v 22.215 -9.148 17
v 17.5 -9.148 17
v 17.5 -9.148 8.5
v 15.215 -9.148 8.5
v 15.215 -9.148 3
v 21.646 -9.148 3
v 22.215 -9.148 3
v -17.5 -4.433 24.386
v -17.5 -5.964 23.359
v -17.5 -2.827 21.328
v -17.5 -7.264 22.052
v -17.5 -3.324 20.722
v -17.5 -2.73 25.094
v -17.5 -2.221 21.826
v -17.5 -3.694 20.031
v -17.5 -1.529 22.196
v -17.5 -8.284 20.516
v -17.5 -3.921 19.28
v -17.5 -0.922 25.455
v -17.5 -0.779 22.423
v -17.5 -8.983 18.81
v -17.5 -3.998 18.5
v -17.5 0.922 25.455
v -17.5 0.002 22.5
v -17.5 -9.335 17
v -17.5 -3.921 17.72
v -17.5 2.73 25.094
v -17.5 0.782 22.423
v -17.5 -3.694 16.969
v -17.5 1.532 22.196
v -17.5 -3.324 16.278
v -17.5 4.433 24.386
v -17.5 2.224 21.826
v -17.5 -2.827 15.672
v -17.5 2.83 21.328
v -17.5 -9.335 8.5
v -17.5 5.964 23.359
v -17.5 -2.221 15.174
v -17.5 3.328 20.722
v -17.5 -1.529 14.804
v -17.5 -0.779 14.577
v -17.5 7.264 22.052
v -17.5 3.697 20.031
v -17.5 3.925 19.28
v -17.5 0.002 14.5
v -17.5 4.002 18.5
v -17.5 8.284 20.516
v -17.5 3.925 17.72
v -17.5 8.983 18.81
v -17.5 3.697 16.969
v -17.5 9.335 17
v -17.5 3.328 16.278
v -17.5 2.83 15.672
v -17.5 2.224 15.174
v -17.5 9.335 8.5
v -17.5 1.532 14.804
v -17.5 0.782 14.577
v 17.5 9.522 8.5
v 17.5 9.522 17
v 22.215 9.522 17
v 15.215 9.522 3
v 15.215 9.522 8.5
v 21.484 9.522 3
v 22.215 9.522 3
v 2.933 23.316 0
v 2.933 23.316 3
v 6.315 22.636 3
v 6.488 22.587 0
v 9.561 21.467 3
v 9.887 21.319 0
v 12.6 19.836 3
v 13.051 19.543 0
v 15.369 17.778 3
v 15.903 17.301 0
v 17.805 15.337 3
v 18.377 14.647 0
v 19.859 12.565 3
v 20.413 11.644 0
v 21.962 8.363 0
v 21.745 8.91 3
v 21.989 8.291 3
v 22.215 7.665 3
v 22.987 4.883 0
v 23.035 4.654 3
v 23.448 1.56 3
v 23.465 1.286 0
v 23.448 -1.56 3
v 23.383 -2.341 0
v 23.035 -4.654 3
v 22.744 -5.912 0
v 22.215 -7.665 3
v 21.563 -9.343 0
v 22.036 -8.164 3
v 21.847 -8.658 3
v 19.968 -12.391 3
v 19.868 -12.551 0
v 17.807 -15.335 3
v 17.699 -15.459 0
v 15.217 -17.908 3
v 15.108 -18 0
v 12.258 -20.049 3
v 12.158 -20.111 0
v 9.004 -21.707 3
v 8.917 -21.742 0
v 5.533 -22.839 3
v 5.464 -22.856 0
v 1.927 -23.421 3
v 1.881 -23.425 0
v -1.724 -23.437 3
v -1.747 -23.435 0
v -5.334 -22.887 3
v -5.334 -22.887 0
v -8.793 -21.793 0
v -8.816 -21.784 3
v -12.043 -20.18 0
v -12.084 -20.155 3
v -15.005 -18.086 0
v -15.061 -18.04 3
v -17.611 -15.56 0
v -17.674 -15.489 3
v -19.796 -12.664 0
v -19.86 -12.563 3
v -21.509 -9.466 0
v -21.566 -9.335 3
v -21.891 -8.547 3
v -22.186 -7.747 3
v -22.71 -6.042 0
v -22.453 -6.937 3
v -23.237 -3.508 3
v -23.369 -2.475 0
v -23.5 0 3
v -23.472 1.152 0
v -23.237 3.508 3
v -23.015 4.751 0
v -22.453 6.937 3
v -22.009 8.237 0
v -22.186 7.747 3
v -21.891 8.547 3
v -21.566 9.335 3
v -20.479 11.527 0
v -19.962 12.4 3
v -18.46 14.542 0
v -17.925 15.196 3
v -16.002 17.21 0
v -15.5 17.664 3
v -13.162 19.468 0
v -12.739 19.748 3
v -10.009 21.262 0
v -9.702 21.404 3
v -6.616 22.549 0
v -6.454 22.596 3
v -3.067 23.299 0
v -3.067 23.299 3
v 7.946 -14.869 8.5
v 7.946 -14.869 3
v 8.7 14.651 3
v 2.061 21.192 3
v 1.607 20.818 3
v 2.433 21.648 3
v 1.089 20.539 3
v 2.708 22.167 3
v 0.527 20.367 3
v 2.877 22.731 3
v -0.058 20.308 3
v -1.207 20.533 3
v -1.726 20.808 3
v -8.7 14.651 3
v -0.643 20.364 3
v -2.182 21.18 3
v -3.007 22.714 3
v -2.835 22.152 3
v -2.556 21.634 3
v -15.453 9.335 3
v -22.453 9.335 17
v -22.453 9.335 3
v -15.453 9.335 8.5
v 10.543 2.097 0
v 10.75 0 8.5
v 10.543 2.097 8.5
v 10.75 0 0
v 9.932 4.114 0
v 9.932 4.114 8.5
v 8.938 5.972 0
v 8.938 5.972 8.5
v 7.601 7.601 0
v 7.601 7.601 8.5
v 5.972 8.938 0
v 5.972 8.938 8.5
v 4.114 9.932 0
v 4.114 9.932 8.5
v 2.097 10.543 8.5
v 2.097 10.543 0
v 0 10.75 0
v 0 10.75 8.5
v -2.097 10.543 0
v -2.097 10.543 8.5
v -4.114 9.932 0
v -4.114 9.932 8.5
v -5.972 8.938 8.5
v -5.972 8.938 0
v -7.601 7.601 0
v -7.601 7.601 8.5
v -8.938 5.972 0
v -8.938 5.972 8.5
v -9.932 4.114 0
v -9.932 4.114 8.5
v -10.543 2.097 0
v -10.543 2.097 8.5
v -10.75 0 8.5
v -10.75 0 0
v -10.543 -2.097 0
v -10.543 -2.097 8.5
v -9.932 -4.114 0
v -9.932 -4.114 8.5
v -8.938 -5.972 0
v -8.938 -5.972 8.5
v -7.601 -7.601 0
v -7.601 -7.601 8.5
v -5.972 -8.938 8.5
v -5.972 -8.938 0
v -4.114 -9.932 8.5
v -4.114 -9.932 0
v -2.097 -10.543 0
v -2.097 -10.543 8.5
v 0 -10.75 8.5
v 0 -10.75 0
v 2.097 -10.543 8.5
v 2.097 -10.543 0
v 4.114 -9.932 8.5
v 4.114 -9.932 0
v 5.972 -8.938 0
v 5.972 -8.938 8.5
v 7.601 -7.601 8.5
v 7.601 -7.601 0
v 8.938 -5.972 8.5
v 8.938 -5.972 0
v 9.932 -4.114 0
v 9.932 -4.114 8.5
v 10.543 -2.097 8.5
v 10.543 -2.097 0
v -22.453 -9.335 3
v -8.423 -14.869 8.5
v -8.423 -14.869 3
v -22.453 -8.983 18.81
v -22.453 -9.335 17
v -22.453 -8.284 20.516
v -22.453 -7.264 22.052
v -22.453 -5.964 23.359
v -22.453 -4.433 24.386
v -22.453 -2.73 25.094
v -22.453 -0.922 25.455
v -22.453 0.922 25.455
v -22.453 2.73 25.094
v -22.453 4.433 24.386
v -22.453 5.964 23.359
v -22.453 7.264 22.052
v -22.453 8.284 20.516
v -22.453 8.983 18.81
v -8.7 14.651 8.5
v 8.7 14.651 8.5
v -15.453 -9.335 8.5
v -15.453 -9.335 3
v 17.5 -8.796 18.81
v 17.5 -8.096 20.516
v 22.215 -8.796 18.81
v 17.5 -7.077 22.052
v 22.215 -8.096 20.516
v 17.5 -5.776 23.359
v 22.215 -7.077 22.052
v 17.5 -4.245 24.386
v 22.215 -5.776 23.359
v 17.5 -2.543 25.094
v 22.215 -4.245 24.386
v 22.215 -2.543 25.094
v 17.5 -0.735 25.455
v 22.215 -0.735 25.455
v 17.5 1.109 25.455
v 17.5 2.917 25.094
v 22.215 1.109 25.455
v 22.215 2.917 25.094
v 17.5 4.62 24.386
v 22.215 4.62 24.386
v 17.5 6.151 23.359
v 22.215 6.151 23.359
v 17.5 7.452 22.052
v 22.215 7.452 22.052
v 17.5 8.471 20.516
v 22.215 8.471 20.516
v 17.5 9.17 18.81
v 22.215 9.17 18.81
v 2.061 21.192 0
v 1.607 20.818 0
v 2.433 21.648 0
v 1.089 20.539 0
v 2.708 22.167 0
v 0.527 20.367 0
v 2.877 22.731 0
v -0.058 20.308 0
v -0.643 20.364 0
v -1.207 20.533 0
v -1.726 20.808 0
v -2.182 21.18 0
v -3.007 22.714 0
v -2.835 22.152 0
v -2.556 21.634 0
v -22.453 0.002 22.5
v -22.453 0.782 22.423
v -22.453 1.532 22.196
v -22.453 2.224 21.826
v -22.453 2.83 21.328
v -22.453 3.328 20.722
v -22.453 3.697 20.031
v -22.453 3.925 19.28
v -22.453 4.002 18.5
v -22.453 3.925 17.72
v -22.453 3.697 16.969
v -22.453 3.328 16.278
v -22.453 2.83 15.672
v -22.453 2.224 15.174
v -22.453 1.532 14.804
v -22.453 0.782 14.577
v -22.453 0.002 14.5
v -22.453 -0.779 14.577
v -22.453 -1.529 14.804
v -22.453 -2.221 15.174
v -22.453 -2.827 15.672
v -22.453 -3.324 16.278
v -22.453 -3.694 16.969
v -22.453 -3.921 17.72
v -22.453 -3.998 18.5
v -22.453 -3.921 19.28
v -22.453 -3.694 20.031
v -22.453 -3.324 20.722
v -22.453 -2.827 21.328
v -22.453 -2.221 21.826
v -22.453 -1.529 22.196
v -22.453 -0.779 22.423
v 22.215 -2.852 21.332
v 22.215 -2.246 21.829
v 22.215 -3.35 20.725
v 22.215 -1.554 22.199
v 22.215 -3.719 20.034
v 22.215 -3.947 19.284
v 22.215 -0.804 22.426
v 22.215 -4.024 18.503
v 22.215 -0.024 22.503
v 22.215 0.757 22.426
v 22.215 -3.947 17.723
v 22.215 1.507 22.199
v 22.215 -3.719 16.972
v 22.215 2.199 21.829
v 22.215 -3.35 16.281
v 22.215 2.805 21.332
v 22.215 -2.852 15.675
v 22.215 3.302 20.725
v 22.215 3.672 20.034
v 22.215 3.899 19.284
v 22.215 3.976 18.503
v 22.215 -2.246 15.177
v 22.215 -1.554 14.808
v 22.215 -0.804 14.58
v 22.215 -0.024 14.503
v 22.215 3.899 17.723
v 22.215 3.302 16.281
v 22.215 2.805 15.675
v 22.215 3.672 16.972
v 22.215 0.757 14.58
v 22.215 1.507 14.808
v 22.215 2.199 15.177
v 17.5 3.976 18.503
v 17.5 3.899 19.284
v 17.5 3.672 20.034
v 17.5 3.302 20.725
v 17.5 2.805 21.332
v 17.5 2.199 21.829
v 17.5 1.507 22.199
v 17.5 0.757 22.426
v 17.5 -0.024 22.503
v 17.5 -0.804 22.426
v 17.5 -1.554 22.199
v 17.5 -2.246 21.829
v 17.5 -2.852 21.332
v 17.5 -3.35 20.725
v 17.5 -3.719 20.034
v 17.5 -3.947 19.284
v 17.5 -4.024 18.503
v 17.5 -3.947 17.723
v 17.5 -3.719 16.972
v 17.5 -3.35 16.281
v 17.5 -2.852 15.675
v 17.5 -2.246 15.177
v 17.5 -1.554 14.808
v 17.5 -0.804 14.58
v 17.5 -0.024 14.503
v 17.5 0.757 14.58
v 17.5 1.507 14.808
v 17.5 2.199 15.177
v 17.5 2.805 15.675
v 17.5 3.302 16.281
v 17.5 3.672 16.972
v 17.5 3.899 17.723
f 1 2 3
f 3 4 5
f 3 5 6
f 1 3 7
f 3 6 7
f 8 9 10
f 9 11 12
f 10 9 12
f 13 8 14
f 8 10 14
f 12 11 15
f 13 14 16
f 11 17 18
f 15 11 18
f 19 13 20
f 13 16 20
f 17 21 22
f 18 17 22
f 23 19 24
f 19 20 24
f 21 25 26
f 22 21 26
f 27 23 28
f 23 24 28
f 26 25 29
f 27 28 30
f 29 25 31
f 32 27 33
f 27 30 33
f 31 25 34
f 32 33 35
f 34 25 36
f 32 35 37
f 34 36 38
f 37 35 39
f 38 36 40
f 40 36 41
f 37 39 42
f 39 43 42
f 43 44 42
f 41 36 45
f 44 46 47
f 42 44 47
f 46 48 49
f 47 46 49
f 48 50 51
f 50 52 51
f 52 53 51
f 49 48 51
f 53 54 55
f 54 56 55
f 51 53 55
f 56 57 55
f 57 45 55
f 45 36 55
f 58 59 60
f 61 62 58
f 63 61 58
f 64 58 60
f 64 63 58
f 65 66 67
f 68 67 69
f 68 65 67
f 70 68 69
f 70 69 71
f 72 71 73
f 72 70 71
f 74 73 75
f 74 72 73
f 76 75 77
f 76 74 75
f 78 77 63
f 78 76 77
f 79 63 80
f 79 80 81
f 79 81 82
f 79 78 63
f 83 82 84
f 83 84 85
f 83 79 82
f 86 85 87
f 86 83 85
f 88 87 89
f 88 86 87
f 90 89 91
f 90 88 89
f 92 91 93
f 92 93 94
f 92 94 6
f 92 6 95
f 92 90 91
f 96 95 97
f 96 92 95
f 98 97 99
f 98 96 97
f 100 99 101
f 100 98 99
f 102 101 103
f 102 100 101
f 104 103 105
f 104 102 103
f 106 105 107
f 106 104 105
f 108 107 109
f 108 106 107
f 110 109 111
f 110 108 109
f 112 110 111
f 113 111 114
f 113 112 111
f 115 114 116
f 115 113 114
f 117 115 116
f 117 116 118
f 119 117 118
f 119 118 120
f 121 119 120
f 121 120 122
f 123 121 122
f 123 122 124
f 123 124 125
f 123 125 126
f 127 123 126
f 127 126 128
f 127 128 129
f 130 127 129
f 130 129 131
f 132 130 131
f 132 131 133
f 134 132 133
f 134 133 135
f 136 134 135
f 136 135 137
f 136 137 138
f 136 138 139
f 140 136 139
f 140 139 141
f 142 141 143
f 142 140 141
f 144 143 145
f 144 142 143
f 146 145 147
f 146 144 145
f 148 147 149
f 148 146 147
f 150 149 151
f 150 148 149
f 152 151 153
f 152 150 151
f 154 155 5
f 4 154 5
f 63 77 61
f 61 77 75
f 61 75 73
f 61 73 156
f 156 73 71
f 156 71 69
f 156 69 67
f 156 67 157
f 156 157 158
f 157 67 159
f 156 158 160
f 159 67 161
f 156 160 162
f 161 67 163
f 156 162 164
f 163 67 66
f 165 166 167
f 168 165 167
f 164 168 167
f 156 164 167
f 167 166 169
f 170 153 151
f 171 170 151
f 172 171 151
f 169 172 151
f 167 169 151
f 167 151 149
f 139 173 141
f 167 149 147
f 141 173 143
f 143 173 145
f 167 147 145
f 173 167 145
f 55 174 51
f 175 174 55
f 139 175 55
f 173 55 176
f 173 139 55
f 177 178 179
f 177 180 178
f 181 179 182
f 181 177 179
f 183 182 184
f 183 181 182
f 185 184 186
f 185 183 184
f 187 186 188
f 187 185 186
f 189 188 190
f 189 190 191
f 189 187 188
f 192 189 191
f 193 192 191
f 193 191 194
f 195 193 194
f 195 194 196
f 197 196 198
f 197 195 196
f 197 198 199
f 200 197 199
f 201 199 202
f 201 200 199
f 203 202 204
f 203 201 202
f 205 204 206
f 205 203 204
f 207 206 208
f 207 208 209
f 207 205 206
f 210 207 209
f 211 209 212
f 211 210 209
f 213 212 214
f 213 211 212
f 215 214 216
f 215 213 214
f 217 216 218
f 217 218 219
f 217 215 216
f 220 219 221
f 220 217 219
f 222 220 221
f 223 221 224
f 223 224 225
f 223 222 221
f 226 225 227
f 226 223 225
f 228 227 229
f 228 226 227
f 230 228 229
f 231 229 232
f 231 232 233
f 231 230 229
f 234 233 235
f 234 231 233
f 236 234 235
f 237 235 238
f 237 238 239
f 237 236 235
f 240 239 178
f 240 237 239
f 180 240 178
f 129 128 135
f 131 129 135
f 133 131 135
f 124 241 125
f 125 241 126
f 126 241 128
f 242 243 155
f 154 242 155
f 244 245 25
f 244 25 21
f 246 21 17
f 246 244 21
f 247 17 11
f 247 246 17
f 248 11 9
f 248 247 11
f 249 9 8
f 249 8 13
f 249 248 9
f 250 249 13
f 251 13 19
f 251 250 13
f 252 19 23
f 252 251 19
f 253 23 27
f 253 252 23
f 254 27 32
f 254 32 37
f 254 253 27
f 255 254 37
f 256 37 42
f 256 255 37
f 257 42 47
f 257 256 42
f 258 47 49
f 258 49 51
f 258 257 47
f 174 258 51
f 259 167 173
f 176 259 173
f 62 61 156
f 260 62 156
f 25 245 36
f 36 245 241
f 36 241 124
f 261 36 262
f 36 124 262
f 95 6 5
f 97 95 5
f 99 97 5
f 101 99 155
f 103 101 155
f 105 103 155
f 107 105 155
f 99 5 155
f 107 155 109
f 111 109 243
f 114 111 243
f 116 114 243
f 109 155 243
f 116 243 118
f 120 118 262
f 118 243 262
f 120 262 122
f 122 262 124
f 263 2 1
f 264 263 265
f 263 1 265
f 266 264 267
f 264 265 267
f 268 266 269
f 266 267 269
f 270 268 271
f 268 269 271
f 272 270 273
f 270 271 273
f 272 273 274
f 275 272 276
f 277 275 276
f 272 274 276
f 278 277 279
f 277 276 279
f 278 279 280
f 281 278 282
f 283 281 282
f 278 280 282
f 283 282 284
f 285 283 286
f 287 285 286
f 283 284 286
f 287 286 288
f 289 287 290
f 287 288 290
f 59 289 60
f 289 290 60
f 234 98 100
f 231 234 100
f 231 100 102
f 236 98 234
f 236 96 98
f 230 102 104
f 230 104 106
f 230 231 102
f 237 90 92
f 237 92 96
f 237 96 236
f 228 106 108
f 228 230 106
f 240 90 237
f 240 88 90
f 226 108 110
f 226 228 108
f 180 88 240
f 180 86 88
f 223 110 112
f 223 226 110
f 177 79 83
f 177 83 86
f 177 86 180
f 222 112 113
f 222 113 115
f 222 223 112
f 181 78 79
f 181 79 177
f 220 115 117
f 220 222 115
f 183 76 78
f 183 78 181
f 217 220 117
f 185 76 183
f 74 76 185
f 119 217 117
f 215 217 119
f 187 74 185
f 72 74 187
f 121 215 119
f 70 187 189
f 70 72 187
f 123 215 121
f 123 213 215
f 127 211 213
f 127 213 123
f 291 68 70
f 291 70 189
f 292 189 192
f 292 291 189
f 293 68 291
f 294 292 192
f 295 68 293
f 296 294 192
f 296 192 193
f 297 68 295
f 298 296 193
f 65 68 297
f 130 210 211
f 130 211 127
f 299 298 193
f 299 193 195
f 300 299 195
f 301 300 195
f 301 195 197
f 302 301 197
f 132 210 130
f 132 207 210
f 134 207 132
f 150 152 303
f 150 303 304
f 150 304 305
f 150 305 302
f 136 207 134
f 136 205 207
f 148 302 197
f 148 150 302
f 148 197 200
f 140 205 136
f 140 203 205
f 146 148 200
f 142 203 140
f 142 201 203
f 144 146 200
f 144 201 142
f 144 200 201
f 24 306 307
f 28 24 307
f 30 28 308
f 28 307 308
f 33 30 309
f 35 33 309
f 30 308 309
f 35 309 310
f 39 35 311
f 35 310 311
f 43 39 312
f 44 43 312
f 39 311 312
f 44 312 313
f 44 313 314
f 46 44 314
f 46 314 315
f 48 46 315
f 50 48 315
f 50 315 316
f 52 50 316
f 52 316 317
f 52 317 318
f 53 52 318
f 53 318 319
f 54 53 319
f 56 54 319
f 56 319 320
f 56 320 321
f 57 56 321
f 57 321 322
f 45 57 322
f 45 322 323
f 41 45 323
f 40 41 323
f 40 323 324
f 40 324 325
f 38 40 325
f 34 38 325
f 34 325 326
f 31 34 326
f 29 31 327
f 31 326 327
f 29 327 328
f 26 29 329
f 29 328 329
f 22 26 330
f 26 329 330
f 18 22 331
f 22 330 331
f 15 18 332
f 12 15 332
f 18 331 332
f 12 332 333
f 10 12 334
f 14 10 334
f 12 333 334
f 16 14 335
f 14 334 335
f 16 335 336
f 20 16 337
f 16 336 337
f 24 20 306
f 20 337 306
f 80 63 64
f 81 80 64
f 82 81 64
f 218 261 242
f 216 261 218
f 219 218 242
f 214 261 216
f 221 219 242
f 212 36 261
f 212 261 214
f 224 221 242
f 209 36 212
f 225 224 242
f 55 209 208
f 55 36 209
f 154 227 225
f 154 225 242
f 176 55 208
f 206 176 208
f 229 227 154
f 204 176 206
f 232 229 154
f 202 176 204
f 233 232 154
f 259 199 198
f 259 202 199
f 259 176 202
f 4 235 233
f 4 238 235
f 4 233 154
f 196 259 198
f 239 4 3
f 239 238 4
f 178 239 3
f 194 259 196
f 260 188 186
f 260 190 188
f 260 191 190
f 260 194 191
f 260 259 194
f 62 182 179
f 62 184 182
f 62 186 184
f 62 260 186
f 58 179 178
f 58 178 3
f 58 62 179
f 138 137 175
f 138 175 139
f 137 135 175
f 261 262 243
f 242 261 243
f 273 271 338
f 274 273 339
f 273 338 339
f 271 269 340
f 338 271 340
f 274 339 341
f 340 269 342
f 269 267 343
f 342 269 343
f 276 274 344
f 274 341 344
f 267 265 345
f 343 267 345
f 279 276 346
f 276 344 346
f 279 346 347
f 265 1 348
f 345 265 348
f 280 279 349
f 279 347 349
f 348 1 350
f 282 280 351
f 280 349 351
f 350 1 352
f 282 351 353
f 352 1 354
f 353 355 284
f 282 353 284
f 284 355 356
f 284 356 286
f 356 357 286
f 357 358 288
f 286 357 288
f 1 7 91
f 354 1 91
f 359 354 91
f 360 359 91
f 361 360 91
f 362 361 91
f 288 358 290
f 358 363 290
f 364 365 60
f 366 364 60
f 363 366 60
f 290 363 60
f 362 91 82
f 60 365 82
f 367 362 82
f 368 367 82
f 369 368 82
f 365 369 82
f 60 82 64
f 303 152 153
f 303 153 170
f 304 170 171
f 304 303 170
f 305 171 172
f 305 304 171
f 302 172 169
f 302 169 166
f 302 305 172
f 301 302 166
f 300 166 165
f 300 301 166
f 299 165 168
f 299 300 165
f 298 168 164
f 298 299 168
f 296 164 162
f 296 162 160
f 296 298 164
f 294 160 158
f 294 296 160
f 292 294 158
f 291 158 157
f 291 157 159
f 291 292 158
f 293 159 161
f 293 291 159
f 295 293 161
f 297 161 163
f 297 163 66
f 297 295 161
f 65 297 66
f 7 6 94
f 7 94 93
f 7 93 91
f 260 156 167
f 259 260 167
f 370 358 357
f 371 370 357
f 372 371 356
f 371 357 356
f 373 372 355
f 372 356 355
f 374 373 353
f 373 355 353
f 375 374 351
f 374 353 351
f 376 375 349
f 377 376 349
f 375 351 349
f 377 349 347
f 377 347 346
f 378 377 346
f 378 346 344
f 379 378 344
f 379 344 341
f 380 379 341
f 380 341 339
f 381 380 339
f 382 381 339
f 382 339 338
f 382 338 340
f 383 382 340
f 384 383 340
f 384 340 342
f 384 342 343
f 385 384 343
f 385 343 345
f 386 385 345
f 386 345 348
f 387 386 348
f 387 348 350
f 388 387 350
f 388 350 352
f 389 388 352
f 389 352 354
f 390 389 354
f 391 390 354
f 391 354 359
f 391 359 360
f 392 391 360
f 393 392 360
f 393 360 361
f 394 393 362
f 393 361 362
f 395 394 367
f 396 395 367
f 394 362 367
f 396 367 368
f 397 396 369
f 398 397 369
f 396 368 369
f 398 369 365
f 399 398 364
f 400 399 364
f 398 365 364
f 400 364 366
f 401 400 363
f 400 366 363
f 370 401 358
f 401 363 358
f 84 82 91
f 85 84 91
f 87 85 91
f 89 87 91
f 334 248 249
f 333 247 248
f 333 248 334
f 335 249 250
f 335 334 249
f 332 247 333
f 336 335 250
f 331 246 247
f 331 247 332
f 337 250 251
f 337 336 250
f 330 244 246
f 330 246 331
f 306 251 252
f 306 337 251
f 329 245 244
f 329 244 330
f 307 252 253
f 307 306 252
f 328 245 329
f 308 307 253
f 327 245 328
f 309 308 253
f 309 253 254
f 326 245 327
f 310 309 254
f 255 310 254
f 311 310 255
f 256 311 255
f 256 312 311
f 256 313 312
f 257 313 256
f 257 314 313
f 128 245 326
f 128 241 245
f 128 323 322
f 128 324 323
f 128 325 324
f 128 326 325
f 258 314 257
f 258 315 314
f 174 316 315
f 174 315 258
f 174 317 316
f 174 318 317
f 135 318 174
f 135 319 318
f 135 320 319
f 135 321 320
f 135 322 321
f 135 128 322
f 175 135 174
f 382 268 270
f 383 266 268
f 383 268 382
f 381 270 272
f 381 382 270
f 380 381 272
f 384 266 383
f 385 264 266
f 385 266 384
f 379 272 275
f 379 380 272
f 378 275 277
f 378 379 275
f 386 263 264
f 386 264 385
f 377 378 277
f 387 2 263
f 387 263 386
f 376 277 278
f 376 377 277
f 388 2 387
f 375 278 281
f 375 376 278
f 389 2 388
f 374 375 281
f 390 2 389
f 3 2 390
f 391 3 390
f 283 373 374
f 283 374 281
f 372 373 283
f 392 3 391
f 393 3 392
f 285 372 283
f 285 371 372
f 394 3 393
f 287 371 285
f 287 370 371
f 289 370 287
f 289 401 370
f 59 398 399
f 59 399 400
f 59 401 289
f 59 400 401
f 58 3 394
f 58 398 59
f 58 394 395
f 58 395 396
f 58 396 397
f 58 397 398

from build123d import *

# Parameters (mm, degrees)
SKETCH1_R           = 10.75
BOSS_EXTRUDE1_DEPTH = 3
SKETCH2_R           = 10.75
SKETCH2_W           = 7
SKETCH2_H           = 18.67
BOSS_EXTRUDE2_DEPTH = 5.5
SKETCH3_W           = 4.95272352
SKETCH3_H           = 18.67
SKETCH3_W_2         = 4.714710678
BOSS_EXTRUDE3_DEPTH = 17
CUT_EXTRUDE1_DEPTH  = 17
SKETCH5_R           = 4
CUT_EXTRUDE2_DEPTH  = 17
CUT_EXTRUDE3_DEPTH  = 17
SKETCH7_R           = 4
CUT_EXTRUDE4_DEPTH  = 17


with BuildPart() as part:
    # Sketch1 → Boss-Extrude1 (new body)
    with BuildSketch(Plane.XY):
        with BuildLine():
            ThreePointArc((2.933453688, 23.316192859), (0.067095287, -23.499904217), (-3.066546312, 23.299062078))
            ThreePointArc((-3.066546312, 23.299062078), (-0.057980921, 20.307627469), (2.933453688, 23.316192859))
        make_face()
        Circle(SKETCH1_R, mode=Mode.SUBTRACT)
    extrude(amount=BOSS_EXTRUDE1_DEPTH)

    # Sketch2 → Boss-Extrude2 (add)
    # profile 1 of 3: a face of its own
    with BuildSketch(Plane.XY.offset(3)):
        Polygon((8.7, 14.650778086), (-8.7, 14.650778086), (-15.45272352, 9.335), (-15.45272352, -9.335), (-8.422507082, -14.869221914), (7.946481399, -14.869221914), (15.214710678, -9.147635088), (15.214710678, 9.522364912), align=None)
        Circle(SKETCH2_R, mode=Mode.SUBTRACT)
    # profile 2 of 3: a face of its own
    with BuildSketch(Plane.XY.offset(3)):
        with Locations((-18.95272352, 0)):
            Rectangle(SKETCH2_W, SKETCH2_H)
    # profile 3 of 3: a face of its own
    with BuildSketch(Plane.XY.offset(3)):
        with Locations((18.714710678, 0.187364912)):
            Rectangle(SKETCH2_W, SKETCH2_H)
    extrude(amount=BOSS_EXTRUDE2_DEPTH)

    # Sketch3 → Boss-Extrude3 (add)
    with BuildSketch(Plane.XY.offset(8.5)):
        with Locations((-19.97636176, 0)):
            Rectangle(SKETCH3_W, SKETCH3_H)
        with Locations((19.857355339, 0.187364912)):
            Rectangle(SKETCH3_W_2, SKETCH3_H)
    extrude(amount=BOSS_EXTRUDE3_DEPTH)

    # Sketch4 → Cut-Extrude1 (cut)
    with BuildSketch(Plane.ZY.offset(22.45272352)):
        with BuildLine():
            Line((17, 9.335), (17, 13.633615677))
            Line((17, 13.633615677), (31.027251007, 13.633615677))
            Line((31.027251007, 13.633615677), (31.027251007, -15.42955238))
            Line((31.027251007, -15.42955238), (17, -15.42955238))
            Line((17, -15.42955238), (17, -9.335))
            ThreePointArc((17, -9.335), (25.5, 0), (17, 9.335))
        make_face()
    extrude(amount=-CUT_EXTRUDE1_DEPTH, mode=Mode.SUBTRACT)

    # Sketch5 → Cut-Extrude2 (cut)
    with BuildSketch(Plane.ZY.offset(22.45272352)):
        with Locations((18.500000216, 0.001740409)):
            Circle(SKETCH5_R)
    extrude(amount=-CUT_EXTRUDE2_DEPTH, mode=Mode.SUBTRACT)

    # Sketch6 → Cut-Extrude3 (cut)
    with BuildSketch(Plane(origin=(22.214710678, 0, 0), x_dir=(0, 0, -1), z_dir=(1, 0, 0))):
        with BuildLine():
            Line((-17, 9.522364912), (-17, 12.0175707))
            Line((-17, 12.0175707), (-28.32322093, 12.0175707))
            Line((-28.32322093, 12.0175707), (-28.32322093, -10.554300966))
            Line((-28.32322093, -10.554300966), (-17, -10.554300966))
            Line((-17, -10.554300966), (-17, -9.147635088))
            ThreePointArc((-17, -9.147635088), (-25.5, 0.187364912), (-17, 9.522364912))
        make_face()
    extrude(amount=-CUT_EXTRUDE3_DEPTH, mode=Mode.SUBTRACT)

    # Sketch7 → Cut-Extrude4 (cut)
    with BuildSketch(Plane(origin=(22.214710678, 0, 0), x_dir=(0, 0, -1), z_dir=(1, 0, 0))):
        with Locations(Location((-18.503182636, -0.023696141, 0), (0, 0, 90))):
            Circle(SKETCH7_R)
    extrude(amount=-CUT_EXTRUDE4_DEPTH, mode=Mode.SUBTRACT)


solid = part.part
